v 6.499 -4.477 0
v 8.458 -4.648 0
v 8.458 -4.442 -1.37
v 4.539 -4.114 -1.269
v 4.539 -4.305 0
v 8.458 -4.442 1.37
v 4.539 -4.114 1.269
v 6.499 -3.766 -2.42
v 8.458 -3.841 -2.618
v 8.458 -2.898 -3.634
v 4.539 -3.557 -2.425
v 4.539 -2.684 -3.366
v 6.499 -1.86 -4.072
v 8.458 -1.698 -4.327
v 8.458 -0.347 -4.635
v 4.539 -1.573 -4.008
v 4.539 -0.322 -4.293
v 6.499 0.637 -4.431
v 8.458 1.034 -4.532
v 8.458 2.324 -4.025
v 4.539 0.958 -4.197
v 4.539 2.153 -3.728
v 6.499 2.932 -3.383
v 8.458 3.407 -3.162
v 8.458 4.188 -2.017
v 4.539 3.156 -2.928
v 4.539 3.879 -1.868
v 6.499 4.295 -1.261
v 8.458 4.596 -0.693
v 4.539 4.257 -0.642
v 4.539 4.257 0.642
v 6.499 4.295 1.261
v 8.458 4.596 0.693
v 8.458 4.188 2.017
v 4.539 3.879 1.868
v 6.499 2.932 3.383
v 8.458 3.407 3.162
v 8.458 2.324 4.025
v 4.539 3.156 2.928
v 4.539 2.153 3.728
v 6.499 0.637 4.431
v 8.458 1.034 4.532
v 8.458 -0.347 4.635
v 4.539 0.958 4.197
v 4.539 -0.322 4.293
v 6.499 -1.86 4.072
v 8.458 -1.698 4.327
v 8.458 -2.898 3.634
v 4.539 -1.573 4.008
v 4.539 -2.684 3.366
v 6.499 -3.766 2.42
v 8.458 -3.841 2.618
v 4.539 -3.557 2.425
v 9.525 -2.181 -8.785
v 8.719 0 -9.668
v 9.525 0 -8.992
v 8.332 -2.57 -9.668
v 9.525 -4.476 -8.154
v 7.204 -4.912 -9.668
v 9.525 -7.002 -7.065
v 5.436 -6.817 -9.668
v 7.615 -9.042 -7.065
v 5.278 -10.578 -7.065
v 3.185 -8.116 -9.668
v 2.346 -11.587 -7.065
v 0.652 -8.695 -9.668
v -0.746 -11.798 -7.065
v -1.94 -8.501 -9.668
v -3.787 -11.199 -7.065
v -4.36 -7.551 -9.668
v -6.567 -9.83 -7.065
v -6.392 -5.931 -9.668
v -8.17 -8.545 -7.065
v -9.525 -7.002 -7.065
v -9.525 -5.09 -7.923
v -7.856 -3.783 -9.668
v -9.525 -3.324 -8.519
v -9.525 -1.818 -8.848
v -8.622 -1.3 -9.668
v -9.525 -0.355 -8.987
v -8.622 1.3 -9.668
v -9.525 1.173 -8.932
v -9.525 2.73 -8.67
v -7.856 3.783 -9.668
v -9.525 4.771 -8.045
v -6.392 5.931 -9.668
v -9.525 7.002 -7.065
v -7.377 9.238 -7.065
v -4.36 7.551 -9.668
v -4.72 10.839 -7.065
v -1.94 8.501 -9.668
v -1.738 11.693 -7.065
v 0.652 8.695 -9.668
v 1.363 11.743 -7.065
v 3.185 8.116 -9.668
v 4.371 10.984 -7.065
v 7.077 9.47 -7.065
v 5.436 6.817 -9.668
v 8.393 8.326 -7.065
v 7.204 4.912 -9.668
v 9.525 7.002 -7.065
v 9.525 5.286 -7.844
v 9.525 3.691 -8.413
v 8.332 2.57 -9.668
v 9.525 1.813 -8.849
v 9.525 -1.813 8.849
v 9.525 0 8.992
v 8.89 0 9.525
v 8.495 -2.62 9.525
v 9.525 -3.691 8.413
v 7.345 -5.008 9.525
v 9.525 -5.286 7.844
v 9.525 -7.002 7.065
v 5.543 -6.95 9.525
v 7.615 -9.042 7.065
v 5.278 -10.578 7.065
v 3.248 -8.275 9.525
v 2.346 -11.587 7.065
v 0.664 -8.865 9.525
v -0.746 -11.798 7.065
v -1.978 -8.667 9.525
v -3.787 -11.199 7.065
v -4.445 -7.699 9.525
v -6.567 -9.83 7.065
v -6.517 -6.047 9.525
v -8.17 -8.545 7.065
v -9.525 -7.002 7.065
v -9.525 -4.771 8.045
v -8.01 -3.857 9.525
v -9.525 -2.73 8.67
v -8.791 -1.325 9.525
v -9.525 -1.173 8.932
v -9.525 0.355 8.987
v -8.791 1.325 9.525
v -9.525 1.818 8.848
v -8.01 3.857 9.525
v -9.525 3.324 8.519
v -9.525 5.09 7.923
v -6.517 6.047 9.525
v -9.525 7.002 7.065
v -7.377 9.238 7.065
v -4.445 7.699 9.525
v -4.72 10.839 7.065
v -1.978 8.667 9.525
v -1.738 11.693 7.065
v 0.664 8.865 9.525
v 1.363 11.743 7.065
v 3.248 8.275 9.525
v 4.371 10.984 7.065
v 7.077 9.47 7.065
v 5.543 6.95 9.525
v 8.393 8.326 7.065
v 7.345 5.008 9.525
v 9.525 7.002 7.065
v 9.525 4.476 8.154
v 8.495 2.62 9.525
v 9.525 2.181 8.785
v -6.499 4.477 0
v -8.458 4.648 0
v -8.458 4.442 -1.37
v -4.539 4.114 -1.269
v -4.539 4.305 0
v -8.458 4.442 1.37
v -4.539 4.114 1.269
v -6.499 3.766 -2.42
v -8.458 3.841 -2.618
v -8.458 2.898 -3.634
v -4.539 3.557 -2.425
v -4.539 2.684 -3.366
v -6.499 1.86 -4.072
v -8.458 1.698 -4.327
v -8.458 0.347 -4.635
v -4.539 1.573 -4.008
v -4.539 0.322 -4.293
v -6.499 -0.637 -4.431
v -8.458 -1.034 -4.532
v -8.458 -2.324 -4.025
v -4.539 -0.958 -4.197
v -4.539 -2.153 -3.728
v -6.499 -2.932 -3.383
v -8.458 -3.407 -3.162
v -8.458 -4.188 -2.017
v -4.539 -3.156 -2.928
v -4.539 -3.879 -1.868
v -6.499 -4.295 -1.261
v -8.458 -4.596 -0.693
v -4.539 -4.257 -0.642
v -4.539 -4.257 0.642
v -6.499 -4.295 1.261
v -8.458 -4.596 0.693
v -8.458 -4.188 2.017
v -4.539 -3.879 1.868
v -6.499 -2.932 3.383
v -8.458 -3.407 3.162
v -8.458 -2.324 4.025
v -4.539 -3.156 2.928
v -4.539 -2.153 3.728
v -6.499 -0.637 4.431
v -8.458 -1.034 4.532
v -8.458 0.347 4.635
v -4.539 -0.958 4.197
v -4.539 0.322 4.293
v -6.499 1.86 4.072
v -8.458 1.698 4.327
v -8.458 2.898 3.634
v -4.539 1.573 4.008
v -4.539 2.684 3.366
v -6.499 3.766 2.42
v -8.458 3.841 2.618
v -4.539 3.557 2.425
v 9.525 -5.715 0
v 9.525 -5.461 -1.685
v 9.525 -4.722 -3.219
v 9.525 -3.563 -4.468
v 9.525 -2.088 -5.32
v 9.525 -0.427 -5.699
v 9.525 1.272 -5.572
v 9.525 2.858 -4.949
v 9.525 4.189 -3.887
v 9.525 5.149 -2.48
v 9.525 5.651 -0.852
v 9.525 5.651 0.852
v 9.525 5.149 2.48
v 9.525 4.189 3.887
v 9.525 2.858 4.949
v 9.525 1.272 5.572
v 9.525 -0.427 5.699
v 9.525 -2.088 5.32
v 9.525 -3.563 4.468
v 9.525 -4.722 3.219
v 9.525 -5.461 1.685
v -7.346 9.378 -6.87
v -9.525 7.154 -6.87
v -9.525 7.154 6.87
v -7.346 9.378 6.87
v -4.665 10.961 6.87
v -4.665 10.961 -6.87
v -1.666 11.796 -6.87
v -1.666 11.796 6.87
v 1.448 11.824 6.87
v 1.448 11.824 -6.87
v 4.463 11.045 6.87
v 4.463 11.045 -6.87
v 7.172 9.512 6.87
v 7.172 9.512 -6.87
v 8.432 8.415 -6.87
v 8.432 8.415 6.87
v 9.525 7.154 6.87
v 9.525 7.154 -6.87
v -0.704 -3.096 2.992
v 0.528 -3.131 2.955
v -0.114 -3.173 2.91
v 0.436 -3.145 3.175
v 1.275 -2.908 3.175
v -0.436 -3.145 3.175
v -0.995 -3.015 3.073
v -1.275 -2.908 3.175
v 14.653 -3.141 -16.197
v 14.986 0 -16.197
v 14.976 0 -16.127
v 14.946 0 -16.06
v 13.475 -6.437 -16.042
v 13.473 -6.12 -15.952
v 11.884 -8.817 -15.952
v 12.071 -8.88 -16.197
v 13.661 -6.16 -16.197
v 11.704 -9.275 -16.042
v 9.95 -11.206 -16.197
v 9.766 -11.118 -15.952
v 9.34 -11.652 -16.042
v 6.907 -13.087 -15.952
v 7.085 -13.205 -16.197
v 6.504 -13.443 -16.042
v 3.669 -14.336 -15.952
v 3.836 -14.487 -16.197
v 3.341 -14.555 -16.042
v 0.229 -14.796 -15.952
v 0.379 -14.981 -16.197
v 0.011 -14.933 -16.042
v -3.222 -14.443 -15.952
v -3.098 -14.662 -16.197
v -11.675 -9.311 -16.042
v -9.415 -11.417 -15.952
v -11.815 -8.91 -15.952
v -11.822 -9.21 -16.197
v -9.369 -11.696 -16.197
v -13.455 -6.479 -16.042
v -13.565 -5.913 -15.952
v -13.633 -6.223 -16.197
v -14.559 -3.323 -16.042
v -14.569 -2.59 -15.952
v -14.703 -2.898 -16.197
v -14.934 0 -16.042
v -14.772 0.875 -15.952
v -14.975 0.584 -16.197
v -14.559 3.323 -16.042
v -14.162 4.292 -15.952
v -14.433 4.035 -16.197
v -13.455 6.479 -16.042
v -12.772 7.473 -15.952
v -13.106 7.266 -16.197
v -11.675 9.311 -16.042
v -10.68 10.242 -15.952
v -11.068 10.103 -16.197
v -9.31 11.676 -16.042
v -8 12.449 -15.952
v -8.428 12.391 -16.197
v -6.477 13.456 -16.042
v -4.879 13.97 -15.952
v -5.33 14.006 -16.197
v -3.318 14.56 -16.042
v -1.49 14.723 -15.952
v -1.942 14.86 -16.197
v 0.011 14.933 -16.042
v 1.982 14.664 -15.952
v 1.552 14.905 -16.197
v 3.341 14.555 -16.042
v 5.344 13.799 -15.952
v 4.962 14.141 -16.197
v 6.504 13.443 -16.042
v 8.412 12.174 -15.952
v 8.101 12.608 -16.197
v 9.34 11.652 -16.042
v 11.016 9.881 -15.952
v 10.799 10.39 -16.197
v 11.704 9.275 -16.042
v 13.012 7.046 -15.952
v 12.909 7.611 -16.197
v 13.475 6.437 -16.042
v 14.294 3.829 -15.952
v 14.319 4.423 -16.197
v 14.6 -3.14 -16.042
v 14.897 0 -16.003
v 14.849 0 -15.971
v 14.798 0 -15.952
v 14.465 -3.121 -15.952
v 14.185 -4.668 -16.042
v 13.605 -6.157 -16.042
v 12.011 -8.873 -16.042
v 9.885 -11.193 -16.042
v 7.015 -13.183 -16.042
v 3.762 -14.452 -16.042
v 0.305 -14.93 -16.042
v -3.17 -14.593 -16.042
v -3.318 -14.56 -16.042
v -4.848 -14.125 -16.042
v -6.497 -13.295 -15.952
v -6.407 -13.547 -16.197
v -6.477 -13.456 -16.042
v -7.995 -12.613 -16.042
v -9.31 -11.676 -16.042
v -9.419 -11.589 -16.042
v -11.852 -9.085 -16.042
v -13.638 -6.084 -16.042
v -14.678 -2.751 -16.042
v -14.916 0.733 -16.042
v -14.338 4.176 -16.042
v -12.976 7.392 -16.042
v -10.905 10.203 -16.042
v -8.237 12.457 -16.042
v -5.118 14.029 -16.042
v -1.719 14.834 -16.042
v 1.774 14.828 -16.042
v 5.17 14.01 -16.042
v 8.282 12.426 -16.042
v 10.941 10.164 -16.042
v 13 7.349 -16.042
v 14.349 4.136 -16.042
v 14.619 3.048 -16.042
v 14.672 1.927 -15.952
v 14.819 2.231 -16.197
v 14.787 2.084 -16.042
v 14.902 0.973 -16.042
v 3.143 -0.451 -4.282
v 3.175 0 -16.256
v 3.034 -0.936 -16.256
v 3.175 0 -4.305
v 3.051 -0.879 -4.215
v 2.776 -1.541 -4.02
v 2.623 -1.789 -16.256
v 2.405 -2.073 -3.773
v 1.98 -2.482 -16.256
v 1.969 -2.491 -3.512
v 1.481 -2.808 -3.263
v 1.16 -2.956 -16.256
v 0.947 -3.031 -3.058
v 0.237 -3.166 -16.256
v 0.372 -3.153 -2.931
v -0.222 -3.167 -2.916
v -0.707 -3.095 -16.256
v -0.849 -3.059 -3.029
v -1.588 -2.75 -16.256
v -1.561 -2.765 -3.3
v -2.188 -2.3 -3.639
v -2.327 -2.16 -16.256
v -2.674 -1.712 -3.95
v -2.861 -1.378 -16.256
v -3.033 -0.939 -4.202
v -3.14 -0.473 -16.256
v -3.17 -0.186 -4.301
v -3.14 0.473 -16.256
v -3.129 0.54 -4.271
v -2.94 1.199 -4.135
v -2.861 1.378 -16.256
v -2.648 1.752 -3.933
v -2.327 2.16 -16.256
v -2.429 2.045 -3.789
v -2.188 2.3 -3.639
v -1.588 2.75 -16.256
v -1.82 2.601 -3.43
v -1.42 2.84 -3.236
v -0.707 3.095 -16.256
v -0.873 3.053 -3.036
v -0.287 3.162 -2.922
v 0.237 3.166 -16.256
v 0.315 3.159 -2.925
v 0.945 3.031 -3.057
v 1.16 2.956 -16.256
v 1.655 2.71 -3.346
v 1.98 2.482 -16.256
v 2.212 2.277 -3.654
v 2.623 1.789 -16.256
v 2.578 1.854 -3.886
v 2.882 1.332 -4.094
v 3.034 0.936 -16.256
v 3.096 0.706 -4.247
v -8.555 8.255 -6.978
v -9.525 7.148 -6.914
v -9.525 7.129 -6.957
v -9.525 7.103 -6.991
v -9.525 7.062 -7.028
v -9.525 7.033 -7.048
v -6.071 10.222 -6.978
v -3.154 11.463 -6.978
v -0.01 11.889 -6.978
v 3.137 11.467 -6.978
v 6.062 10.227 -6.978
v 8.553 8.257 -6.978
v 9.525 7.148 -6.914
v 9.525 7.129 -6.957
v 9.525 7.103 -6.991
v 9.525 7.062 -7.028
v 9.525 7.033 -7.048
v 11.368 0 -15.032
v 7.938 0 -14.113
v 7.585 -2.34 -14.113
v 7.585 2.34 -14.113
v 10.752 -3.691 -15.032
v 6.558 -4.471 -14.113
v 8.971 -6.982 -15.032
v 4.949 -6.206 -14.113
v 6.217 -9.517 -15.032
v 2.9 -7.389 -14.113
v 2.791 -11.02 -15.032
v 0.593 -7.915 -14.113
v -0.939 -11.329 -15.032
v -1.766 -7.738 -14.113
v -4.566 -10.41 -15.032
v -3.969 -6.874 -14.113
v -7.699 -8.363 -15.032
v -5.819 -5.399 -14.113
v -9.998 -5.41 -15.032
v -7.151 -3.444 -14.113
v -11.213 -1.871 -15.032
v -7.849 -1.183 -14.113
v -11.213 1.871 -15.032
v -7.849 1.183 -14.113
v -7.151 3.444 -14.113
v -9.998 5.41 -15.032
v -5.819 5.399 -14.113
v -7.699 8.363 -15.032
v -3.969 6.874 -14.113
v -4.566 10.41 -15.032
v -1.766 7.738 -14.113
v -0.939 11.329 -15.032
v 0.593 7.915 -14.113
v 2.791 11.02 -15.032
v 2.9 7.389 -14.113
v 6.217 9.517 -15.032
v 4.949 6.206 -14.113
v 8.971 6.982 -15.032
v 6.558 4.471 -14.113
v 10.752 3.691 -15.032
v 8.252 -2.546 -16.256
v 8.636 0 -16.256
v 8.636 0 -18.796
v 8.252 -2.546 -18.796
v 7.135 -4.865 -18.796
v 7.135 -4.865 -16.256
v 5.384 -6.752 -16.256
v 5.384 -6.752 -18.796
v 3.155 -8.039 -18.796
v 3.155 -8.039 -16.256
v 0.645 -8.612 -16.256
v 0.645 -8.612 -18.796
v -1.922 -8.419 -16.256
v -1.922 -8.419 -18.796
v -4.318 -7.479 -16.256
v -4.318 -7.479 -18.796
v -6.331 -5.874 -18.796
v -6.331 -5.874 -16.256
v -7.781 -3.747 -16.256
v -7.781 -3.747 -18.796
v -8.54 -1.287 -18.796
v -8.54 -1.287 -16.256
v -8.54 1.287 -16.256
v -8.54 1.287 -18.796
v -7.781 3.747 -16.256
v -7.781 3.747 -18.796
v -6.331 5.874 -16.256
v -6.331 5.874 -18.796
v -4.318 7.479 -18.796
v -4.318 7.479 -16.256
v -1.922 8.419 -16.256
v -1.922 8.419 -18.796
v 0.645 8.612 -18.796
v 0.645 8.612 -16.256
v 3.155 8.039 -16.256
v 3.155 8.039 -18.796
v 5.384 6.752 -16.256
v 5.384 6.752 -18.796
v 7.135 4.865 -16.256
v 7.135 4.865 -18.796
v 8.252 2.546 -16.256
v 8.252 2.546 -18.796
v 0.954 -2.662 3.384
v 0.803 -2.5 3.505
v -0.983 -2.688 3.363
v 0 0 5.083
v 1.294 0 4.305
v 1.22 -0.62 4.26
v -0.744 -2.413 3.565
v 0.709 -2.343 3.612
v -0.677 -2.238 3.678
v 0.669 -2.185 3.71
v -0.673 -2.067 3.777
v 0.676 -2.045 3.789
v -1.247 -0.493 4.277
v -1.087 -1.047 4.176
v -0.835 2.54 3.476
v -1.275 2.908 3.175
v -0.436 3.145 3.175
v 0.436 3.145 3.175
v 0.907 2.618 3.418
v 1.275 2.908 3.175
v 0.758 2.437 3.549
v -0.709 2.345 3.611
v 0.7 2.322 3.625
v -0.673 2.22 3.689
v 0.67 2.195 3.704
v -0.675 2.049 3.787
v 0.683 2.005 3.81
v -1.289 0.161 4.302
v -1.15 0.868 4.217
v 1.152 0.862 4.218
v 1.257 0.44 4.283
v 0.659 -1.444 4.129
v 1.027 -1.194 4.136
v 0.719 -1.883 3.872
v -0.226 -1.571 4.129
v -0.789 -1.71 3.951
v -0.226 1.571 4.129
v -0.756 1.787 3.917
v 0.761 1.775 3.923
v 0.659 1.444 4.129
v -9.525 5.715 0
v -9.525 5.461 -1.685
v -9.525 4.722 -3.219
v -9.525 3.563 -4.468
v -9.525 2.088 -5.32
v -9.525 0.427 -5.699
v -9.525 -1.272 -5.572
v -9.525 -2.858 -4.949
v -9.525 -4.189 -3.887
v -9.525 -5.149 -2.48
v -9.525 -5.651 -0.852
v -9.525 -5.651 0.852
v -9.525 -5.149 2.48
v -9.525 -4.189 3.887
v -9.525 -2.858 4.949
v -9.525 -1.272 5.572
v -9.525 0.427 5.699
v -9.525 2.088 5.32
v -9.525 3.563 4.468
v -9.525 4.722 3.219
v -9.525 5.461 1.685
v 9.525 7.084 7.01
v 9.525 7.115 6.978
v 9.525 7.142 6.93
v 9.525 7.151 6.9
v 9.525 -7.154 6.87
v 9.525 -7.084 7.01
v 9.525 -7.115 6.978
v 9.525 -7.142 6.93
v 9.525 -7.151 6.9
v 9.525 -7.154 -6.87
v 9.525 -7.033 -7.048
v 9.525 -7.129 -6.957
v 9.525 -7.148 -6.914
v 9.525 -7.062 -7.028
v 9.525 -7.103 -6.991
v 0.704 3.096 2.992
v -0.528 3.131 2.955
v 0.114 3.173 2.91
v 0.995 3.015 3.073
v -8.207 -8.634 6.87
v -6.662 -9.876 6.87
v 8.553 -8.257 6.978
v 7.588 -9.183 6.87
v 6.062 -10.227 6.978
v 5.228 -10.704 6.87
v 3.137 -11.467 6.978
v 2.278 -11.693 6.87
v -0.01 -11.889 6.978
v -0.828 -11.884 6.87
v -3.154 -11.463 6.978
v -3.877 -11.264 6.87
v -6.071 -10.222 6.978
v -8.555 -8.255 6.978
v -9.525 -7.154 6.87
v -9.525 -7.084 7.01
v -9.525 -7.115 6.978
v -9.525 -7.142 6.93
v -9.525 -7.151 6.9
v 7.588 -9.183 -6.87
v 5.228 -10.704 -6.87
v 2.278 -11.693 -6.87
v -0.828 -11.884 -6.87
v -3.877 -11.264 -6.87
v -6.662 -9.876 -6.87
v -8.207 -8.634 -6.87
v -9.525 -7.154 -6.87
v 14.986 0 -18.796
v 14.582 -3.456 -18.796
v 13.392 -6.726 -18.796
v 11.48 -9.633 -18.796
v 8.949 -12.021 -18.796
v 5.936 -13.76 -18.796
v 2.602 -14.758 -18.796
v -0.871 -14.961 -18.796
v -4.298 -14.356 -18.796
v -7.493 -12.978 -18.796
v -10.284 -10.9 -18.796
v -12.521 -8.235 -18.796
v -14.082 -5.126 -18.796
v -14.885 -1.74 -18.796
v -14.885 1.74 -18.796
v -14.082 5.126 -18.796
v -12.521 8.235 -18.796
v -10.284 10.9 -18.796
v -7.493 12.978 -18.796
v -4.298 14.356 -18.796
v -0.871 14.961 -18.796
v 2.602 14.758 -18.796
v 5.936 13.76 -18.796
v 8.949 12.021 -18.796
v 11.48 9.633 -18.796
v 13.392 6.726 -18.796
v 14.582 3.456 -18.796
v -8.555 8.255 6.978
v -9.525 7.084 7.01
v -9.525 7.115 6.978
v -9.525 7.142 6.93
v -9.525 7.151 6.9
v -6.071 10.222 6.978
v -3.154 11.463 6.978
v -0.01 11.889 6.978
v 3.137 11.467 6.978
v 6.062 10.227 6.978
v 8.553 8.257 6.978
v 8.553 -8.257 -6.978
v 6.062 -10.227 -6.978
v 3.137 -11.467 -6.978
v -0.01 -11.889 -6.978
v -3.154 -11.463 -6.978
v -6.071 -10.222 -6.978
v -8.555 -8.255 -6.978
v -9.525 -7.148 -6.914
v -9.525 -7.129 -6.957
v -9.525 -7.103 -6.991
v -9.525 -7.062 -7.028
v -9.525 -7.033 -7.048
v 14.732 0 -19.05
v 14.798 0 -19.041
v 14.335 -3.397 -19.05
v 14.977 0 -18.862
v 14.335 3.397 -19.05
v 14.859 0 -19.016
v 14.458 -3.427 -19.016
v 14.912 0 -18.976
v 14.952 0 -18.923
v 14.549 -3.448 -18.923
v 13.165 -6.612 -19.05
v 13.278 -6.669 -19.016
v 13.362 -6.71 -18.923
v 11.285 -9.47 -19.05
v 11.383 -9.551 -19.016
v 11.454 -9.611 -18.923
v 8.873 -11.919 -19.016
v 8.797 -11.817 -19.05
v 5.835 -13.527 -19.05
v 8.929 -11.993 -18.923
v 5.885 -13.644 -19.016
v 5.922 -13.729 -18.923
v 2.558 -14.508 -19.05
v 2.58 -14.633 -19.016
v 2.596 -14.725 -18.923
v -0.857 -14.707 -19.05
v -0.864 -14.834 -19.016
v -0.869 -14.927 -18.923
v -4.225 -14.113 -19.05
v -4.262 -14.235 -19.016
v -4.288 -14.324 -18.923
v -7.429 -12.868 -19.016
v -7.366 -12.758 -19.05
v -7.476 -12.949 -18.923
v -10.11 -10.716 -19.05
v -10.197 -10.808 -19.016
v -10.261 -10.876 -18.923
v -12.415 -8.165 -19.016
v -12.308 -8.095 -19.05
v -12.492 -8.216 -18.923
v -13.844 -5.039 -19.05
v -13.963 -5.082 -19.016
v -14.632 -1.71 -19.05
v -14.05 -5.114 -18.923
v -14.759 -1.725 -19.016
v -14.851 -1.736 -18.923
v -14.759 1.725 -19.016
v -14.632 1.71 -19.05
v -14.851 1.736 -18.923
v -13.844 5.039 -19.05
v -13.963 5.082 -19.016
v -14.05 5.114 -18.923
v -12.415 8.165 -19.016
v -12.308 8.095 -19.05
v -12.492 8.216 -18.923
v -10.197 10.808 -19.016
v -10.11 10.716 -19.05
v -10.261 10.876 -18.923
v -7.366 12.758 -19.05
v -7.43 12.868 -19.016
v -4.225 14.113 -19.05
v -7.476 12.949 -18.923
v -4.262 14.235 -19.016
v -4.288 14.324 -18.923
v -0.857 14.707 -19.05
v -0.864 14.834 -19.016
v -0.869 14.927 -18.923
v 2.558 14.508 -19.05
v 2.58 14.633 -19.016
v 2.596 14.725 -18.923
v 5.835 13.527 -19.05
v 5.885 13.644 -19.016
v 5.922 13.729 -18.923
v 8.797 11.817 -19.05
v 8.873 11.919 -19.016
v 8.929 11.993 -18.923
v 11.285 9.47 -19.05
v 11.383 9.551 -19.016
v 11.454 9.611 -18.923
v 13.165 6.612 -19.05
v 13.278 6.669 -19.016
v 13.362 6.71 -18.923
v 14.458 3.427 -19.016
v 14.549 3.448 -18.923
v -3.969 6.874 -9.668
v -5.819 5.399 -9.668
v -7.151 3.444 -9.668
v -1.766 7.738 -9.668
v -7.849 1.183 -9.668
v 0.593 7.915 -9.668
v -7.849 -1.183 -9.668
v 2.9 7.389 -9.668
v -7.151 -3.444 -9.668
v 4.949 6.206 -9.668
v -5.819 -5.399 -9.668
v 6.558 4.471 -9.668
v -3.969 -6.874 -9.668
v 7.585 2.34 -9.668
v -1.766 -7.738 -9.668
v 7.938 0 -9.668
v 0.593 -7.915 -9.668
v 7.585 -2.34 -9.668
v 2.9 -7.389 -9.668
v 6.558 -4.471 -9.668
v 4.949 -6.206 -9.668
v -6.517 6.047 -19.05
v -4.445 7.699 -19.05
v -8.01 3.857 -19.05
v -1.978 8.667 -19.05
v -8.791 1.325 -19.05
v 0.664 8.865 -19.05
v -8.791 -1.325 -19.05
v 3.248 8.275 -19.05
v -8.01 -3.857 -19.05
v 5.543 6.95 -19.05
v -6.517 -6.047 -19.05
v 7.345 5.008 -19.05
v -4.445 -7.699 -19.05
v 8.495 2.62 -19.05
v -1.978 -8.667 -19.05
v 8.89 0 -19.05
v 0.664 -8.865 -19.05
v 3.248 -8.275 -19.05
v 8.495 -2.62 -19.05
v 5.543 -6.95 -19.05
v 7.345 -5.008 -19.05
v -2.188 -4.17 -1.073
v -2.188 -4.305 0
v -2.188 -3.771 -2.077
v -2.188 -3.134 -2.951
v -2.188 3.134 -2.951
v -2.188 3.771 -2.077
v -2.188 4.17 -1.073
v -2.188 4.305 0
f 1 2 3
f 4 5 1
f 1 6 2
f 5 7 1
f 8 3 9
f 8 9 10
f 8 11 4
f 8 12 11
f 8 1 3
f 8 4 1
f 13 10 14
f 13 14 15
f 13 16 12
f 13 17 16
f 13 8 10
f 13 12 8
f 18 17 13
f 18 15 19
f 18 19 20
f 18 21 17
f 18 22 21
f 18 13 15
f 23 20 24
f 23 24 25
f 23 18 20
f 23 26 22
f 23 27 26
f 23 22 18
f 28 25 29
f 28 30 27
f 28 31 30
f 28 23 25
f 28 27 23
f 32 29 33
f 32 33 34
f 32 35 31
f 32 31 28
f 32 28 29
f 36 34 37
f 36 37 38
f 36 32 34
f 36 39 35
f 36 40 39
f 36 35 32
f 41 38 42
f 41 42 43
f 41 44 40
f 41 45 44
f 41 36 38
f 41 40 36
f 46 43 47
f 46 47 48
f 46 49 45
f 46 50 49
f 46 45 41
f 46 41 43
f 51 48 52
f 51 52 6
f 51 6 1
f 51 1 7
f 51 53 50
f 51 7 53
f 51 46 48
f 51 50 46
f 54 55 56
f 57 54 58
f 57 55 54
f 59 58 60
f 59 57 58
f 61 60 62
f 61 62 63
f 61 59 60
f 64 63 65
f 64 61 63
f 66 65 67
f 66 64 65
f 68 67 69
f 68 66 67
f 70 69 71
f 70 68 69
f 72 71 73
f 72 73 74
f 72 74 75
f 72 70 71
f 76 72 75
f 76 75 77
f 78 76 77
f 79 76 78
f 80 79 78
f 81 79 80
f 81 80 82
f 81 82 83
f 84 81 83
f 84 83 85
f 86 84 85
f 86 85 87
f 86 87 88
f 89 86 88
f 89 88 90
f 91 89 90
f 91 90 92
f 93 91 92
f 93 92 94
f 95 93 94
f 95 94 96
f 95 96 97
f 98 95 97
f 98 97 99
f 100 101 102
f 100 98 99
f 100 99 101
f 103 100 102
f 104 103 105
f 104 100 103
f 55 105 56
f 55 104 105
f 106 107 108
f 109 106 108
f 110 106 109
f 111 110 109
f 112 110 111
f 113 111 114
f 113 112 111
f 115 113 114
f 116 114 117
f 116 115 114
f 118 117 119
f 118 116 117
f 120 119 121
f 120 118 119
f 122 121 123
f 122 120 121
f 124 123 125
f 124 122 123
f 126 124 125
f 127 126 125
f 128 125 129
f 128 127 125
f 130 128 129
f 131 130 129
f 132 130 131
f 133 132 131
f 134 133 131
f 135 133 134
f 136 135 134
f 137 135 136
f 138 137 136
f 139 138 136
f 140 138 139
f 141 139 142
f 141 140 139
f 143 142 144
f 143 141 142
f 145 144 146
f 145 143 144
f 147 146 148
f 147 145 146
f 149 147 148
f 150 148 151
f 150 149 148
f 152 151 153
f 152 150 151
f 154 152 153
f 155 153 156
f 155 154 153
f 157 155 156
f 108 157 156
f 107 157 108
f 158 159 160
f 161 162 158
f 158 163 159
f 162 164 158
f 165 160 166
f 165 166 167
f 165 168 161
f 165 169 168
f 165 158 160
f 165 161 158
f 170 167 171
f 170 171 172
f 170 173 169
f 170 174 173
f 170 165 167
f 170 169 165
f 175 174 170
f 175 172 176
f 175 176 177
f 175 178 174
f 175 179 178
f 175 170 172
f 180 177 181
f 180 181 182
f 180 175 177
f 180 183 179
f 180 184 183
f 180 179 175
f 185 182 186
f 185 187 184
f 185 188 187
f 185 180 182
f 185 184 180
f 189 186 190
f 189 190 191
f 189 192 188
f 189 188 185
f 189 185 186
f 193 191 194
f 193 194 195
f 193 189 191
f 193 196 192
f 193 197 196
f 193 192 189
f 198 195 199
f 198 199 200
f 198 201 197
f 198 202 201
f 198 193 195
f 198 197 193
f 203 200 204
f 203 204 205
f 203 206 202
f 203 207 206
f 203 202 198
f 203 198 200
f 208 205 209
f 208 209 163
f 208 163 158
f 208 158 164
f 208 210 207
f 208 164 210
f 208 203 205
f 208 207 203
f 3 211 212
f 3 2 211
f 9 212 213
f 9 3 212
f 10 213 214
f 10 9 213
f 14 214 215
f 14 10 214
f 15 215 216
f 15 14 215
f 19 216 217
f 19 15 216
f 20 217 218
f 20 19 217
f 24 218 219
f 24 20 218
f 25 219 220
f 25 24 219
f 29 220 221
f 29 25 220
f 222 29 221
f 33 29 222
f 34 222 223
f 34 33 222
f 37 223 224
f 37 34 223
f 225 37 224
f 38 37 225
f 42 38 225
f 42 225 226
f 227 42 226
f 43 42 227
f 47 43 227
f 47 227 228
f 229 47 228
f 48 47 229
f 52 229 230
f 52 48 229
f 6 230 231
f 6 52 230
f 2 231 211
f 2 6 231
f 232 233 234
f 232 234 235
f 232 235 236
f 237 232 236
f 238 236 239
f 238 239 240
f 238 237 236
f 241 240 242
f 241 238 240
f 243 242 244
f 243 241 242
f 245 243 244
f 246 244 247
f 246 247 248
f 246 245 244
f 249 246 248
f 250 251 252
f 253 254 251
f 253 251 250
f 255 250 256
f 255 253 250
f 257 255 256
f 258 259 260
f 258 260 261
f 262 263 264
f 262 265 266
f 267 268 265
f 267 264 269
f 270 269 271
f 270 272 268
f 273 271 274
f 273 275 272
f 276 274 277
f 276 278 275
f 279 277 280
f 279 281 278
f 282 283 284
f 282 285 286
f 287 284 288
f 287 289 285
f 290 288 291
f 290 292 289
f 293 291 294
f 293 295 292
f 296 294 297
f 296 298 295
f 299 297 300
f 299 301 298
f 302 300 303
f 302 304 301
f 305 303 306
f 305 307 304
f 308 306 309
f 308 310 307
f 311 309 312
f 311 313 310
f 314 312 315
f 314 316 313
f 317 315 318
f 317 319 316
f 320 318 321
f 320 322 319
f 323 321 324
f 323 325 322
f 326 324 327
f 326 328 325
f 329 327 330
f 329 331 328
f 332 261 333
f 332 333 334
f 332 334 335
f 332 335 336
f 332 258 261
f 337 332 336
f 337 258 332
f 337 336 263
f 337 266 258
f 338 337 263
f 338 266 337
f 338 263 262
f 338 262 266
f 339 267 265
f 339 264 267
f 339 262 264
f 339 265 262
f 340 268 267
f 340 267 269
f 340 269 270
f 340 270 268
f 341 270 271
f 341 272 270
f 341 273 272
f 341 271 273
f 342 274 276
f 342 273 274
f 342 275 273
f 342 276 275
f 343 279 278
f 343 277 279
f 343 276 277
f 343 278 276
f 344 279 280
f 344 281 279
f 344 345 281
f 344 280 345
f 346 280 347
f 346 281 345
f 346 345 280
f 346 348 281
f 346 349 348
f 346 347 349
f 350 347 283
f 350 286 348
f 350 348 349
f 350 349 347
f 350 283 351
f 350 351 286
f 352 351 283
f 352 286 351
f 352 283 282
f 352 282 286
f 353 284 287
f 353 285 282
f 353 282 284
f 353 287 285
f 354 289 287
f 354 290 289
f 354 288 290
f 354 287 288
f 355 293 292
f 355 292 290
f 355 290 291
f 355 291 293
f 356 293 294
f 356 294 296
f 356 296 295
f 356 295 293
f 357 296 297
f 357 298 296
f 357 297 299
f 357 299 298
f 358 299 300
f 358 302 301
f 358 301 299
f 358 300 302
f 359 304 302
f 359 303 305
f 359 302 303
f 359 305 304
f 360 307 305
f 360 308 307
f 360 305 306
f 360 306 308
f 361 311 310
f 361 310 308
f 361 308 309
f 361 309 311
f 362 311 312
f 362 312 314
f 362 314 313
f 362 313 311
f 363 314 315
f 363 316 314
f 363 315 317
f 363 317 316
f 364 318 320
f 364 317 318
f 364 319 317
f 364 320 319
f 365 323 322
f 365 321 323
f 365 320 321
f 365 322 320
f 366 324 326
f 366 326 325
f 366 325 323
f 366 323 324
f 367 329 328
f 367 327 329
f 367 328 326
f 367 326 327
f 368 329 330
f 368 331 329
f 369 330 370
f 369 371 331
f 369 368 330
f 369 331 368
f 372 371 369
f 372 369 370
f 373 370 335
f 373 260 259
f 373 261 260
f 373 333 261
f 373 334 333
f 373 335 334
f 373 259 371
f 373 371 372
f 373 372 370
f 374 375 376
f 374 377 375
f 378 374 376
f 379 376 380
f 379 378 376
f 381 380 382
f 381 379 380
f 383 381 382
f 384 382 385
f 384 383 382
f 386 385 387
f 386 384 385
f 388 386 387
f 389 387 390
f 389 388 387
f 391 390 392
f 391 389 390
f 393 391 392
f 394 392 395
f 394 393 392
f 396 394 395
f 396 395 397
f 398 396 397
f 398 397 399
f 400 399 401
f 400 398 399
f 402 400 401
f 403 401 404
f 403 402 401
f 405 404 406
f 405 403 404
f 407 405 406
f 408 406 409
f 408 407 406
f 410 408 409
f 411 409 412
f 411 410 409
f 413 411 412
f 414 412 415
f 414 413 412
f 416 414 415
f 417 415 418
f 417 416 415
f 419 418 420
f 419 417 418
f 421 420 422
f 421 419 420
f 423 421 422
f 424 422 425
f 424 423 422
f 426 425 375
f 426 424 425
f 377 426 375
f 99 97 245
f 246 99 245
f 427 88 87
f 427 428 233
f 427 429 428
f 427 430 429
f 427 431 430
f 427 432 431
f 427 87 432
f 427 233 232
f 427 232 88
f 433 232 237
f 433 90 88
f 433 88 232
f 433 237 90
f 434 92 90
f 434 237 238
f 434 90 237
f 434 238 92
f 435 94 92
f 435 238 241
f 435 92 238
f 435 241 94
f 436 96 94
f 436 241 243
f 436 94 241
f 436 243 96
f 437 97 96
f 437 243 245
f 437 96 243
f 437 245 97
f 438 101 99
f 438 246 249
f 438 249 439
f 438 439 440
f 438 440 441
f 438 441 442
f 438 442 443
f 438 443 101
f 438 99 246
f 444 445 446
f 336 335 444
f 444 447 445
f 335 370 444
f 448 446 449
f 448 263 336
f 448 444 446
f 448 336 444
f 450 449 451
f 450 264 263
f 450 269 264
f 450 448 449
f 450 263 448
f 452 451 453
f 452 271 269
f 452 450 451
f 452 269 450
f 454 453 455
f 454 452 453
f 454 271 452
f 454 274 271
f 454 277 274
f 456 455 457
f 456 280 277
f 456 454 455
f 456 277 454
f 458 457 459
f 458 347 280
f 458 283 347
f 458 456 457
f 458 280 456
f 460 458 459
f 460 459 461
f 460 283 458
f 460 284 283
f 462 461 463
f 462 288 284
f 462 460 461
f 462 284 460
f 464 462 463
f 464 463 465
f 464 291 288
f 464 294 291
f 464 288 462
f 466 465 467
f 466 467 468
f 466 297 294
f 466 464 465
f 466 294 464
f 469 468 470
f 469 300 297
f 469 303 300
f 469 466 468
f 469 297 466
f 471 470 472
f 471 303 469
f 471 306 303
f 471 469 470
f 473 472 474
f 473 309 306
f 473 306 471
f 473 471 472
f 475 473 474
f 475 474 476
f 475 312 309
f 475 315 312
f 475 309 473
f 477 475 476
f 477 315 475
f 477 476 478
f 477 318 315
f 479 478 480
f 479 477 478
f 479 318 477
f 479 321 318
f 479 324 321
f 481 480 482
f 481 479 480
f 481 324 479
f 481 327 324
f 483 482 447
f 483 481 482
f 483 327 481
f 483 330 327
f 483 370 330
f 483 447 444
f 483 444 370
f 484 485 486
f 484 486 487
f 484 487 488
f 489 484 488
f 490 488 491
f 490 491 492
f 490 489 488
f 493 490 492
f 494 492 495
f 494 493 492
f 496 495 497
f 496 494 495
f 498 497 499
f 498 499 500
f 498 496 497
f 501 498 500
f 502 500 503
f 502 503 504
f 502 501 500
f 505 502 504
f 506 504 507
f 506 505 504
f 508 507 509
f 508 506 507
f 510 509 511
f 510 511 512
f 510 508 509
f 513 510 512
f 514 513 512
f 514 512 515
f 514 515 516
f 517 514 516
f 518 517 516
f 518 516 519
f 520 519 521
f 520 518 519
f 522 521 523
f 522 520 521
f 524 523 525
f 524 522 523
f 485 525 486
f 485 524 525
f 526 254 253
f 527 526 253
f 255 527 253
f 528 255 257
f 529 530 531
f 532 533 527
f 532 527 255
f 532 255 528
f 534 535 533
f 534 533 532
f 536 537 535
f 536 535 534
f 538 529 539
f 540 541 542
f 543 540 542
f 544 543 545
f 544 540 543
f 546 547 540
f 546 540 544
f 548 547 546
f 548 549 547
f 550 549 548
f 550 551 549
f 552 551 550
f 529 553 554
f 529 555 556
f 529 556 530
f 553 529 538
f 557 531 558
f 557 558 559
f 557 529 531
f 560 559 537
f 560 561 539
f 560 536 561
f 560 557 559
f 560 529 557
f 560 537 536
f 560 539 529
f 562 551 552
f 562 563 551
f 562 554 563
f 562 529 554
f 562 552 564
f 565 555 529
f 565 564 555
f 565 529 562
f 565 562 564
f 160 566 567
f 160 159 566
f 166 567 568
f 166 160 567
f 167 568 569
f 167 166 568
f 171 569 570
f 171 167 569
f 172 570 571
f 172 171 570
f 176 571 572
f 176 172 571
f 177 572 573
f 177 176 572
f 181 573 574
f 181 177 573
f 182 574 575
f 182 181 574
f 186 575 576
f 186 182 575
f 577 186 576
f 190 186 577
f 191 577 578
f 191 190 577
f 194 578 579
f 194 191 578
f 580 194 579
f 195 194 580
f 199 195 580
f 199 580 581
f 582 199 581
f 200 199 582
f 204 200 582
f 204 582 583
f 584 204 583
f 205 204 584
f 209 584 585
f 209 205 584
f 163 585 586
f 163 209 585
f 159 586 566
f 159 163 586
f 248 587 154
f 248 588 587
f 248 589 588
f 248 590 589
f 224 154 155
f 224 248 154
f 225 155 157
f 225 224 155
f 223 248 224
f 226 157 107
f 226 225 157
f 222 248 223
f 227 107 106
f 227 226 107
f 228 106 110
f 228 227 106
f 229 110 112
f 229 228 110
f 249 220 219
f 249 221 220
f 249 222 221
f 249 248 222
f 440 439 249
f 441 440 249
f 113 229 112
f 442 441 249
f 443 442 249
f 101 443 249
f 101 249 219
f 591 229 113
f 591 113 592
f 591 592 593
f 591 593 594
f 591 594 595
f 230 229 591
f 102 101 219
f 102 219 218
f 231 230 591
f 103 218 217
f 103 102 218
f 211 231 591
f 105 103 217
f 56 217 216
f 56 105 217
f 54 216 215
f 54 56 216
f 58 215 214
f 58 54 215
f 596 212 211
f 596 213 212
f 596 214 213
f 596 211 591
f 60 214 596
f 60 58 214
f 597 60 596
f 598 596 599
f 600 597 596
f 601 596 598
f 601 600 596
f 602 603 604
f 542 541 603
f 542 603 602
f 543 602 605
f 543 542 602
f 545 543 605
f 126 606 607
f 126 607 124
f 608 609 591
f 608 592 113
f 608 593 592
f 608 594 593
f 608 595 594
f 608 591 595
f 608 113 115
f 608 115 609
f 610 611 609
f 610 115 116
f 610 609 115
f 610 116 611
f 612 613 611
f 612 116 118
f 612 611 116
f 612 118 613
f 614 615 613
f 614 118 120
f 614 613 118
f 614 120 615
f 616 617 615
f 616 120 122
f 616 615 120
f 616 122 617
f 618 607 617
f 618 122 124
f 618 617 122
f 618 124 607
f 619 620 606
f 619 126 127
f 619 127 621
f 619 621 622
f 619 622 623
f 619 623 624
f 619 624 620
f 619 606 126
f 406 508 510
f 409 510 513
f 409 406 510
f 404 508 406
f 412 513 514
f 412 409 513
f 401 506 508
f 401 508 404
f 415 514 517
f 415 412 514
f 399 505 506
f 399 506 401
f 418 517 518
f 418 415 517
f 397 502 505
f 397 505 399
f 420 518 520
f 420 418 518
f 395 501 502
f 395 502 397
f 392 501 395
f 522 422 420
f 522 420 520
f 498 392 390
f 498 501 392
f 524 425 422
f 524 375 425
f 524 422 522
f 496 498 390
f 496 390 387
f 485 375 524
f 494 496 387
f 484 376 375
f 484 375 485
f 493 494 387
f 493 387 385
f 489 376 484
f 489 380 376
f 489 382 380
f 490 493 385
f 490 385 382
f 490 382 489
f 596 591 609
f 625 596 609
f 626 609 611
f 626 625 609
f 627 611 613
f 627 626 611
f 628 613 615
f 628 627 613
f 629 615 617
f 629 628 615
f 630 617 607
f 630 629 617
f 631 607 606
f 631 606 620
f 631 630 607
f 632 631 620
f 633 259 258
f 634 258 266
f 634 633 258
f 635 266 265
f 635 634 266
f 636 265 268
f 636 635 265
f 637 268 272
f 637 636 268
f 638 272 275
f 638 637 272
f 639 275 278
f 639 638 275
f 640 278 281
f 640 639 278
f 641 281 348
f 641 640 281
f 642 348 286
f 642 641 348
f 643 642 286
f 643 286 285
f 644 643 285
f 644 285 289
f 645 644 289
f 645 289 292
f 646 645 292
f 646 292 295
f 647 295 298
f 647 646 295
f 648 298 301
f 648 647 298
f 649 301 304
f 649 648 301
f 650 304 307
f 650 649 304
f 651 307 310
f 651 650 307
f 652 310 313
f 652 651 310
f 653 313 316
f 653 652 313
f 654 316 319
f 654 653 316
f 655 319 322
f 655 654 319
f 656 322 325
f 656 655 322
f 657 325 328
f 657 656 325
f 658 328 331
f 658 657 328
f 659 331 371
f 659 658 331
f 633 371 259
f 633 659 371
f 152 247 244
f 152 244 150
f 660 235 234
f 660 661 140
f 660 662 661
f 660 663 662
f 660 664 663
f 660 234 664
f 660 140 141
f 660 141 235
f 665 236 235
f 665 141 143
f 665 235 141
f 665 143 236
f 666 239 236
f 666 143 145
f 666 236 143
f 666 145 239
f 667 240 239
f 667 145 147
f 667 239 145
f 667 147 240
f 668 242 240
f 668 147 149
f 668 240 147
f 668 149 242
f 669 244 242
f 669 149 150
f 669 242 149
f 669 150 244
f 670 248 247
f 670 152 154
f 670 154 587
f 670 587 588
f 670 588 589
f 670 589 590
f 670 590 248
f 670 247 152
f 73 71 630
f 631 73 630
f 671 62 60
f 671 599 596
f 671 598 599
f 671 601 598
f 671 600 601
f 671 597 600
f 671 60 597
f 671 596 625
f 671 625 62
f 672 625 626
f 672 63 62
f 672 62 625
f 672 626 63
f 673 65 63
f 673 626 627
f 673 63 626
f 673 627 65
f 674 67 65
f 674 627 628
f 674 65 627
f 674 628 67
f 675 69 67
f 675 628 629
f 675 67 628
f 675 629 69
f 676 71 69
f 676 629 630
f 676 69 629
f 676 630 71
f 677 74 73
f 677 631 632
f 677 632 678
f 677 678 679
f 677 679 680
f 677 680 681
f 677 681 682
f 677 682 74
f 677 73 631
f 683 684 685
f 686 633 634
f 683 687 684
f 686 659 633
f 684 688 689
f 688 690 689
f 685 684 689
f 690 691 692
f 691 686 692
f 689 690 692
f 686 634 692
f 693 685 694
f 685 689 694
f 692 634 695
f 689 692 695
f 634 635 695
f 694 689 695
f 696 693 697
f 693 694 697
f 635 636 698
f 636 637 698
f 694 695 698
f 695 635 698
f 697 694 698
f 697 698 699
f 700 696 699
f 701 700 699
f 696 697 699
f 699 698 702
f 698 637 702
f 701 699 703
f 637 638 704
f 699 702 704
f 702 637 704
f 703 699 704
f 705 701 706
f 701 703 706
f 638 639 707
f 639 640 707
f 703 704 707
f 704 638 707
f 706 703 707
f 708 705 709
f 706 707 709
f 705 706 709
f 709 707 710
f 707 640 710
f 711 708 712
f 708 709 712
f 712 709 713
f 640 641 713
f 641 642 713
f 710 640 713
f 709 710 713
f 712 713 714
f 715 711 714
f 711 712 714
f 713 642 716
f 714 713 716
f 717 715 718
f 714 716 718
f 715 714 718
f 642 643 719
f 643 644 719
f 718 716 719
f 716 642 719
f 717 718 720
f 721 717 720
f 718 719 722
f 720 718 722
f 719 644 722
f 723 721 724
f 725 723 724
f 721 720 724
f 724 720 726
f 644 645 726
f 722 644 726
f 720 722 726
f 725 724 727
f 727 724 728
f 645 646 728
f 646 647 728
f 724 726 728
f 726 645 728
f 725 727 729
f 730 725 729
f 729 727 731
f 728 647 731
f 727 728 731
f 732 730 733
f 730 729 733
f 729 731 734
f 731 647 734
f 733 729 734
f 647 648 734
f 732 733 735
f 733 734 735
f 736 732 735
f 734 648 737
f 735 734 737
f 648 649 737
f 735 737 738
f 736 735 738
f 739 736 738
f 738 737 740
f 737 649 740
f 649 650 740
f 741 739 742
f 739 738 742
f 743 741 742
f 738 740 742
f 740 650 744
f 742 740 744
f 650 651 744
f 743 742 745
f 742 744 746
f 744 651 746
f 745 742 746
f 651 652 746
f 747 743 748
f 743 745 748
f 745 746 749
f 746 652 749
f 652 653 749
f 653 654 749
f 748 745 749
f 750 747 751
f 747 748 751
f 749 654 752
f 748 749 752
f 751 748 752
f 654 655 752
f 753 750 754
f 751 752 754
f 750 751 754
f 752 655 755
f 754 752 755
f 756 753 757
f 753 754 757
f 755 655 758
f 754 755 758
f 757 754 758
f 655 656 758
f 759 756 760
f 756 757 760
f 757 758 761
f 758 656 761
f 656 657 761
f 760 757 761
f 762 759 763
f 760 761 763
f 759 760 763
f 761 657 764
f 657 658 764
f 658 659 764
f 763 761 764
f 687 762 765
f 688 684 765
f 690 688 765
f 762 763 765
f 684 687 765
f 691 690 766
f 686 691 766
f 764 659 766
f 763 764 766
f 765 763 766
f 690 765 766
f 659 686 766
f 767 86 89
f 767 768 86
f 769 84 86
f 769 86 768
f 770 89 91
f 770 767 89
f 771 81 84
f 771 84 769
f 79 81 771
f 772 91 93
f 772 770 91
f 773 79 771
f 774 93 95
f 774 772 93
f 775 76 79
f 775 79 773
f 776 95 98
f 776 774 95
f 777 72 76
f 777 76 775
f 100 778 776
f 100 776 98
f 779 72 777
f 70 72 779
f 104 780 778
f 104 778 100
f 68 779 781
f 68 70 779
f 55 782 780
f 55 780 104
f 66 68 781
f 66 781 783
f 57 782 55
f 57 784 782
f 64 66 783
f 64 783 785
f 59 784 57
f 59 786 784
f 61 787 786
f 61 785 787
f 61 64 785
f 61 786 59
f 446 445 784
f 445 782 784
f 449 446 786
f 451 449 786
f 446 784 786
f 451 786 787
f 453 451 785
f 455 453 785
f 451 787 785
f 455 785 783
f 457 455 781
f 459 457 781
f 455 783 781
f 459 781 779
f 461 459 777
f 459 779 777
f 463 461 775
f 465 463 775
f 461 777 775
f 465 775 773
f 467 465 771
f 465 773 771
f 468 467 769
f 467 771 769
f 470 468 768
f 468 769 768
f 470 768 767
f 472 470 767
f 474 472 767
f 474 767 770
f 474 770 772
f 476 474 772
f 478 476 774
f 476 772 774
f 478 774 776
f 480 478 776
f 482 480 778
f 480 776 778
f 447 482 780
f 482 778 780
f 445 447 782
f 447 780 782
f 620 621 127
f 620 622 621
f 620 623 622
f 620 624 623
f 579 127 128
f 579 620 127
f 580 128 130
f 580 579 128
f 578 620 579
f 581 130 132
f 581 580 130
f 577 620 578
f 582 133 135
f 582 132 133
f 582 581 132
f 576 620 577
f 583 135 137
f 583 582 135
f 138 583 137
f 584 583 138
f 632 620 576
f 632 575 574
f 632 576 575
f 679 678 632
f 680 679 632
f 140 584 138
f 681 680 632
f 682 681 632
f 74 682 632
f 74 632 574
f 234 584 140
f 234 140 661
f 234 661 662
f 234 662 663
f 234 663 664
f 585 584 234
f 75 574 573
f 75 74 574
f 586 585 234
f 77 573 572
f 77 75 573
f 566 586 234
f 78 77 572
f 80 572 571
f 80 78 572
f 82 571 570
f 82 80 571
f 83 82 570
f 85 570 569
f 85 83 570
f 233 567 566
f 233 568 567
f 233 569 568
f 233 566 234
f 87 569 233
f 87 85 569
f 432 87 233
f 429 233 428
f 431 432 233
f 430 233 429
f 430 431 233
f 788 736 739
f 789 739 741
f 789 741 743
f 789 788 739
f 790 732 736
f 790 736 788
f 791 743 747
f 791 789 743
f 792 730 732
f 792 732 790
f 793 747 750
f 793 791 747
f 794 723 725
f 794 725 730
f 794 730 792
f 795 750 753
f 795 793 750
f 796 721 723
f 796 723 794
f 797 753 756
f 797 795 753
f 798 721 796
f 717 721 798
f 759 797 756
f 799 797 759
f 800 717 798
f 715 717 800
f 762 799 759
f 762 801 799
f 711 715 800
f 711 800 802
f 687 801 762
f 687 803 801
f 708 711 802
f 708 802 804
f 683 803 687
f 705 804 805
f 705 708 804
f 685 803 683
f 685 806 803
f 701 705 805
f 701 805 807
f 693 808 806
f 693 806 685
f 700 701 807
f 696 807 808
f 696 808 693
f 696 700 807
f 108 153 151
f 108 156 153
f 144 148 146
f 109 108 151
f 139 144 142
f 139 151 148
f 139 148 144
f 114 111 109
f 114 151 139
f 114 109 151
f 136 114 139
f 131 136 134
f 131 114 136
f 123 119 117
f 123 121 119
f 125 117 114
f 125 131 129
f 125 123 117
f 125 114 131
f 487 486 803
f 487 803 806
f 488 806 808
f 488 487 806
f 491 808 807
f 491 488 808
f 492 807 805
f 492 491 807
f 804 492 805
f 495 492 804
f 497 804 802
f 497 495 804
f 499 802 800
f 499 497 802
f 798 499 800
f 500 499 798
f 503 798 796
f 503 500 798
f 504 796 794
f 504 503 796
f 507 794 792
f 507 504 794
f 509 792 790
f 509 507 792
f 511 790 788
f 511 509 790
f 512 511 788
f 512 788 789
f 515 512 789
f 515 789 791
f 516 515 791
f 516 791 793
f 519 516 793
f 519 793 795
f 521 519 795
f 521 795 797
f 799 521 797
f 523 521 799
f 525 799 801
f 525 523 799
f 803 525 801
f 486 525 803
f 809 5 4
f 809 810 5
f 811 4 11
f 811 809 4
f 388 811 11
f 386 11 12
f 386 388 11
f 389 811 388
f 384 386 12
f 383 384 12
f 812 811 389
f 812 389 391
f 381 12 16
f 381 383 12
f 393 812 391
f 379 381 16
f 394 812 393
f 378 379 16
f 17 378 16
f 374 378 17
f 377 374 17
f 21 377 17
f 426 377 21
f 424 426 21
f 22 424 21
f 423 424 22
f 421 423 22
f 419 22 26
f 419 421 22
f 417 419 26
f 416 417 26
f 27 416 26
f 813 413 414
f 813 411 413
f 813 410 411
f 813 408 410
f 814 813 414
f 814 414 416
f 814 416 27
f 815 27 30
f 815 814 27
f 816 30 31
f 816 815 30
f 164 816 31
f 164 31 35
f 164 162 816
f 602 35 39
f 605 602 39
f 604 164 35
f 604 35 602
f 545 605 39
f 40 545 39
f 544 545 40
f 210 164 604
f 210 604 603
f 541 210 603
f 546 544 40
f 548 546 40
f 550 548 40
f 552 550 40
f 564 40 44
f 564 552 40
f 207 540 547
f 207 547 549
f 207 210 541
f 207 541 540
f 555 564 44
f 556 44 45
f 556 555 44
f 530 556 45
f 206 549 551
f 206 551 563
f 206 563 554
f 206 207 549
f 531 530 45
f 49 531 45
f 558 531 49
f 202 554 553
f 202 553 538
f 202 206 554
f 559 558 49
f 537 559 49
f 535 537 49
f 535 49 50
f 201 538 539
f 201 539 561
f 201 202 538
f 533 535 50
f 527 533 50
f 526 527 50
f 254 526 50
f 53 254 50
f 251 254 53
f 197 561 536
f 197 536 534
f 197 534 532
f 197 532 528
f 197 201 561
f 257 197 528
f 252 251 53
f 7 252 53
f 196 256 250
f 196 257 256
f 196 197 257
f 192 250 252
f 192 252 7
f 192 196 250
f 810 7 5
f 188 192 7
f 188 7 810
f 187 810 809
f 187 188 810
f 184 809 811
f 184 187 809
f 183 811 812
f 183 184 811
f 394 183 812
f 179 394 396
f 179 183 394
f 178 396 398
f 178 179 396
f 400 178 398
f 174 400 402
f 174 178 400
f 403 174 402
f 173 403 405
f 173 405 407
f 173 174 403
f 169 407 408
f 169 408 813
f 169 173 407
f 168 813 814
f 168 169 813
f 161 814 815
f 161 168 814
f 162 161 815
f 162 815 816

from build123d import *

# Parameters (mm, degrees)
BOSS_EXTRUDE1_DEPTH      = 12.7
BOSS_EXTRUDE1_DEPTH_BACK = 25.4
SKETCH4_R                = 15.875
CHAMFER1_SIZE            = 0.254
FILLET1_R                = 0.254
CIRPATTERN1_COUNT        = 2


with BuildPart() as part:
    # Sketch4 → Boss-Extrude1 (new, two sides: drawn at the far end of the back side and taken through both)
    with BuildSketch(Plane.XY.offset(-BOSS_EXTRUDE1_DEPTH_BACK)):
        Circle(SKETCH4_R)
    extrude(amount=BOSS_EXTRUDE1_DEPTH + BOSS_EXTRUDE1_DEPTH_BACK)

    # Sketch1 → Cut-Revolve2 (revolve, cut)
    with BuildSketch(Plane.ZY):
        Polygon((-16.256, 3.175), (3.175, 3.175), (5.082732465, 0), (-53.588062875, 0), (-53.588062875, 25.4), (15.265422121, 25.4), (15.265422121, 0), (9.525, 0), (9.525, 8.89), (6.988737455, 11.9126), (-6.988737455, 11.9126), (-9.668360117, 8.719150065), (-9.668360117, 7.9375), (-10.324242399, 7.9375), (-14.113360117, 7.9375), (-16.002, 14.986), (-19.05, 14.986), (-19.05, 8.636), (-16.256, 8.636), align=None)
    revolve(axis=Axis((0, 0, 24.527557732), (0, 0, -1)), mode=Mode.SUBTRACT)

    # Chamfer1
    chamfer1_edges = [part.edges().sort_by_distance(p)[0] for p in [
        (0, -8.636, -19.05),
    ]]
    chamfer(chamfer1_edges, length=CHAMFER1_SIZE)

    # Fillet1
    fillet1_edges = [part.edges().sort_by_distance(p)[0] for p in [
        (0, -11.9126, 6.988737455),
        (0, -11.9126, -6.988737455),
        (0, -14.986, -19.05),
        (0, -14.986, -16.002),
    ]]
    fillet(fillet1_edges, radius=FILLET1_R)

    # Sketch6 → Cut-Revolve3 (revolve, cut)
    with BuildSketch(Plane.XY):
        Polygon((-4.7752, 0), (22.225, 0), (22.225, -12.7), (9.525, -12.7), (9.525, -5.715), (8.4582, -4.6482), (4.538835065, -4.3053), (-2.188314777, -4.3053), align=None)
    cut_revolve3 = revolve(axis=Axis((22.225, 0, 0), (1, 0, 0)), mode=Mode.SUBTRACT)

    # CirPattern1: Cut-Revolve3 ×2 about axis
    cirpattern1_axis = Axis((0, 0, -23.67915), (0, 0, 1))
    for i in range(1, CIRPATTERN1_COUNT):
        add(cut_revolve3.rotate(cirpattern1_axis, i * 360 / CIRPATTERN1_COUNT), mode=Mode.SUBTRACT)


solid = part.part
